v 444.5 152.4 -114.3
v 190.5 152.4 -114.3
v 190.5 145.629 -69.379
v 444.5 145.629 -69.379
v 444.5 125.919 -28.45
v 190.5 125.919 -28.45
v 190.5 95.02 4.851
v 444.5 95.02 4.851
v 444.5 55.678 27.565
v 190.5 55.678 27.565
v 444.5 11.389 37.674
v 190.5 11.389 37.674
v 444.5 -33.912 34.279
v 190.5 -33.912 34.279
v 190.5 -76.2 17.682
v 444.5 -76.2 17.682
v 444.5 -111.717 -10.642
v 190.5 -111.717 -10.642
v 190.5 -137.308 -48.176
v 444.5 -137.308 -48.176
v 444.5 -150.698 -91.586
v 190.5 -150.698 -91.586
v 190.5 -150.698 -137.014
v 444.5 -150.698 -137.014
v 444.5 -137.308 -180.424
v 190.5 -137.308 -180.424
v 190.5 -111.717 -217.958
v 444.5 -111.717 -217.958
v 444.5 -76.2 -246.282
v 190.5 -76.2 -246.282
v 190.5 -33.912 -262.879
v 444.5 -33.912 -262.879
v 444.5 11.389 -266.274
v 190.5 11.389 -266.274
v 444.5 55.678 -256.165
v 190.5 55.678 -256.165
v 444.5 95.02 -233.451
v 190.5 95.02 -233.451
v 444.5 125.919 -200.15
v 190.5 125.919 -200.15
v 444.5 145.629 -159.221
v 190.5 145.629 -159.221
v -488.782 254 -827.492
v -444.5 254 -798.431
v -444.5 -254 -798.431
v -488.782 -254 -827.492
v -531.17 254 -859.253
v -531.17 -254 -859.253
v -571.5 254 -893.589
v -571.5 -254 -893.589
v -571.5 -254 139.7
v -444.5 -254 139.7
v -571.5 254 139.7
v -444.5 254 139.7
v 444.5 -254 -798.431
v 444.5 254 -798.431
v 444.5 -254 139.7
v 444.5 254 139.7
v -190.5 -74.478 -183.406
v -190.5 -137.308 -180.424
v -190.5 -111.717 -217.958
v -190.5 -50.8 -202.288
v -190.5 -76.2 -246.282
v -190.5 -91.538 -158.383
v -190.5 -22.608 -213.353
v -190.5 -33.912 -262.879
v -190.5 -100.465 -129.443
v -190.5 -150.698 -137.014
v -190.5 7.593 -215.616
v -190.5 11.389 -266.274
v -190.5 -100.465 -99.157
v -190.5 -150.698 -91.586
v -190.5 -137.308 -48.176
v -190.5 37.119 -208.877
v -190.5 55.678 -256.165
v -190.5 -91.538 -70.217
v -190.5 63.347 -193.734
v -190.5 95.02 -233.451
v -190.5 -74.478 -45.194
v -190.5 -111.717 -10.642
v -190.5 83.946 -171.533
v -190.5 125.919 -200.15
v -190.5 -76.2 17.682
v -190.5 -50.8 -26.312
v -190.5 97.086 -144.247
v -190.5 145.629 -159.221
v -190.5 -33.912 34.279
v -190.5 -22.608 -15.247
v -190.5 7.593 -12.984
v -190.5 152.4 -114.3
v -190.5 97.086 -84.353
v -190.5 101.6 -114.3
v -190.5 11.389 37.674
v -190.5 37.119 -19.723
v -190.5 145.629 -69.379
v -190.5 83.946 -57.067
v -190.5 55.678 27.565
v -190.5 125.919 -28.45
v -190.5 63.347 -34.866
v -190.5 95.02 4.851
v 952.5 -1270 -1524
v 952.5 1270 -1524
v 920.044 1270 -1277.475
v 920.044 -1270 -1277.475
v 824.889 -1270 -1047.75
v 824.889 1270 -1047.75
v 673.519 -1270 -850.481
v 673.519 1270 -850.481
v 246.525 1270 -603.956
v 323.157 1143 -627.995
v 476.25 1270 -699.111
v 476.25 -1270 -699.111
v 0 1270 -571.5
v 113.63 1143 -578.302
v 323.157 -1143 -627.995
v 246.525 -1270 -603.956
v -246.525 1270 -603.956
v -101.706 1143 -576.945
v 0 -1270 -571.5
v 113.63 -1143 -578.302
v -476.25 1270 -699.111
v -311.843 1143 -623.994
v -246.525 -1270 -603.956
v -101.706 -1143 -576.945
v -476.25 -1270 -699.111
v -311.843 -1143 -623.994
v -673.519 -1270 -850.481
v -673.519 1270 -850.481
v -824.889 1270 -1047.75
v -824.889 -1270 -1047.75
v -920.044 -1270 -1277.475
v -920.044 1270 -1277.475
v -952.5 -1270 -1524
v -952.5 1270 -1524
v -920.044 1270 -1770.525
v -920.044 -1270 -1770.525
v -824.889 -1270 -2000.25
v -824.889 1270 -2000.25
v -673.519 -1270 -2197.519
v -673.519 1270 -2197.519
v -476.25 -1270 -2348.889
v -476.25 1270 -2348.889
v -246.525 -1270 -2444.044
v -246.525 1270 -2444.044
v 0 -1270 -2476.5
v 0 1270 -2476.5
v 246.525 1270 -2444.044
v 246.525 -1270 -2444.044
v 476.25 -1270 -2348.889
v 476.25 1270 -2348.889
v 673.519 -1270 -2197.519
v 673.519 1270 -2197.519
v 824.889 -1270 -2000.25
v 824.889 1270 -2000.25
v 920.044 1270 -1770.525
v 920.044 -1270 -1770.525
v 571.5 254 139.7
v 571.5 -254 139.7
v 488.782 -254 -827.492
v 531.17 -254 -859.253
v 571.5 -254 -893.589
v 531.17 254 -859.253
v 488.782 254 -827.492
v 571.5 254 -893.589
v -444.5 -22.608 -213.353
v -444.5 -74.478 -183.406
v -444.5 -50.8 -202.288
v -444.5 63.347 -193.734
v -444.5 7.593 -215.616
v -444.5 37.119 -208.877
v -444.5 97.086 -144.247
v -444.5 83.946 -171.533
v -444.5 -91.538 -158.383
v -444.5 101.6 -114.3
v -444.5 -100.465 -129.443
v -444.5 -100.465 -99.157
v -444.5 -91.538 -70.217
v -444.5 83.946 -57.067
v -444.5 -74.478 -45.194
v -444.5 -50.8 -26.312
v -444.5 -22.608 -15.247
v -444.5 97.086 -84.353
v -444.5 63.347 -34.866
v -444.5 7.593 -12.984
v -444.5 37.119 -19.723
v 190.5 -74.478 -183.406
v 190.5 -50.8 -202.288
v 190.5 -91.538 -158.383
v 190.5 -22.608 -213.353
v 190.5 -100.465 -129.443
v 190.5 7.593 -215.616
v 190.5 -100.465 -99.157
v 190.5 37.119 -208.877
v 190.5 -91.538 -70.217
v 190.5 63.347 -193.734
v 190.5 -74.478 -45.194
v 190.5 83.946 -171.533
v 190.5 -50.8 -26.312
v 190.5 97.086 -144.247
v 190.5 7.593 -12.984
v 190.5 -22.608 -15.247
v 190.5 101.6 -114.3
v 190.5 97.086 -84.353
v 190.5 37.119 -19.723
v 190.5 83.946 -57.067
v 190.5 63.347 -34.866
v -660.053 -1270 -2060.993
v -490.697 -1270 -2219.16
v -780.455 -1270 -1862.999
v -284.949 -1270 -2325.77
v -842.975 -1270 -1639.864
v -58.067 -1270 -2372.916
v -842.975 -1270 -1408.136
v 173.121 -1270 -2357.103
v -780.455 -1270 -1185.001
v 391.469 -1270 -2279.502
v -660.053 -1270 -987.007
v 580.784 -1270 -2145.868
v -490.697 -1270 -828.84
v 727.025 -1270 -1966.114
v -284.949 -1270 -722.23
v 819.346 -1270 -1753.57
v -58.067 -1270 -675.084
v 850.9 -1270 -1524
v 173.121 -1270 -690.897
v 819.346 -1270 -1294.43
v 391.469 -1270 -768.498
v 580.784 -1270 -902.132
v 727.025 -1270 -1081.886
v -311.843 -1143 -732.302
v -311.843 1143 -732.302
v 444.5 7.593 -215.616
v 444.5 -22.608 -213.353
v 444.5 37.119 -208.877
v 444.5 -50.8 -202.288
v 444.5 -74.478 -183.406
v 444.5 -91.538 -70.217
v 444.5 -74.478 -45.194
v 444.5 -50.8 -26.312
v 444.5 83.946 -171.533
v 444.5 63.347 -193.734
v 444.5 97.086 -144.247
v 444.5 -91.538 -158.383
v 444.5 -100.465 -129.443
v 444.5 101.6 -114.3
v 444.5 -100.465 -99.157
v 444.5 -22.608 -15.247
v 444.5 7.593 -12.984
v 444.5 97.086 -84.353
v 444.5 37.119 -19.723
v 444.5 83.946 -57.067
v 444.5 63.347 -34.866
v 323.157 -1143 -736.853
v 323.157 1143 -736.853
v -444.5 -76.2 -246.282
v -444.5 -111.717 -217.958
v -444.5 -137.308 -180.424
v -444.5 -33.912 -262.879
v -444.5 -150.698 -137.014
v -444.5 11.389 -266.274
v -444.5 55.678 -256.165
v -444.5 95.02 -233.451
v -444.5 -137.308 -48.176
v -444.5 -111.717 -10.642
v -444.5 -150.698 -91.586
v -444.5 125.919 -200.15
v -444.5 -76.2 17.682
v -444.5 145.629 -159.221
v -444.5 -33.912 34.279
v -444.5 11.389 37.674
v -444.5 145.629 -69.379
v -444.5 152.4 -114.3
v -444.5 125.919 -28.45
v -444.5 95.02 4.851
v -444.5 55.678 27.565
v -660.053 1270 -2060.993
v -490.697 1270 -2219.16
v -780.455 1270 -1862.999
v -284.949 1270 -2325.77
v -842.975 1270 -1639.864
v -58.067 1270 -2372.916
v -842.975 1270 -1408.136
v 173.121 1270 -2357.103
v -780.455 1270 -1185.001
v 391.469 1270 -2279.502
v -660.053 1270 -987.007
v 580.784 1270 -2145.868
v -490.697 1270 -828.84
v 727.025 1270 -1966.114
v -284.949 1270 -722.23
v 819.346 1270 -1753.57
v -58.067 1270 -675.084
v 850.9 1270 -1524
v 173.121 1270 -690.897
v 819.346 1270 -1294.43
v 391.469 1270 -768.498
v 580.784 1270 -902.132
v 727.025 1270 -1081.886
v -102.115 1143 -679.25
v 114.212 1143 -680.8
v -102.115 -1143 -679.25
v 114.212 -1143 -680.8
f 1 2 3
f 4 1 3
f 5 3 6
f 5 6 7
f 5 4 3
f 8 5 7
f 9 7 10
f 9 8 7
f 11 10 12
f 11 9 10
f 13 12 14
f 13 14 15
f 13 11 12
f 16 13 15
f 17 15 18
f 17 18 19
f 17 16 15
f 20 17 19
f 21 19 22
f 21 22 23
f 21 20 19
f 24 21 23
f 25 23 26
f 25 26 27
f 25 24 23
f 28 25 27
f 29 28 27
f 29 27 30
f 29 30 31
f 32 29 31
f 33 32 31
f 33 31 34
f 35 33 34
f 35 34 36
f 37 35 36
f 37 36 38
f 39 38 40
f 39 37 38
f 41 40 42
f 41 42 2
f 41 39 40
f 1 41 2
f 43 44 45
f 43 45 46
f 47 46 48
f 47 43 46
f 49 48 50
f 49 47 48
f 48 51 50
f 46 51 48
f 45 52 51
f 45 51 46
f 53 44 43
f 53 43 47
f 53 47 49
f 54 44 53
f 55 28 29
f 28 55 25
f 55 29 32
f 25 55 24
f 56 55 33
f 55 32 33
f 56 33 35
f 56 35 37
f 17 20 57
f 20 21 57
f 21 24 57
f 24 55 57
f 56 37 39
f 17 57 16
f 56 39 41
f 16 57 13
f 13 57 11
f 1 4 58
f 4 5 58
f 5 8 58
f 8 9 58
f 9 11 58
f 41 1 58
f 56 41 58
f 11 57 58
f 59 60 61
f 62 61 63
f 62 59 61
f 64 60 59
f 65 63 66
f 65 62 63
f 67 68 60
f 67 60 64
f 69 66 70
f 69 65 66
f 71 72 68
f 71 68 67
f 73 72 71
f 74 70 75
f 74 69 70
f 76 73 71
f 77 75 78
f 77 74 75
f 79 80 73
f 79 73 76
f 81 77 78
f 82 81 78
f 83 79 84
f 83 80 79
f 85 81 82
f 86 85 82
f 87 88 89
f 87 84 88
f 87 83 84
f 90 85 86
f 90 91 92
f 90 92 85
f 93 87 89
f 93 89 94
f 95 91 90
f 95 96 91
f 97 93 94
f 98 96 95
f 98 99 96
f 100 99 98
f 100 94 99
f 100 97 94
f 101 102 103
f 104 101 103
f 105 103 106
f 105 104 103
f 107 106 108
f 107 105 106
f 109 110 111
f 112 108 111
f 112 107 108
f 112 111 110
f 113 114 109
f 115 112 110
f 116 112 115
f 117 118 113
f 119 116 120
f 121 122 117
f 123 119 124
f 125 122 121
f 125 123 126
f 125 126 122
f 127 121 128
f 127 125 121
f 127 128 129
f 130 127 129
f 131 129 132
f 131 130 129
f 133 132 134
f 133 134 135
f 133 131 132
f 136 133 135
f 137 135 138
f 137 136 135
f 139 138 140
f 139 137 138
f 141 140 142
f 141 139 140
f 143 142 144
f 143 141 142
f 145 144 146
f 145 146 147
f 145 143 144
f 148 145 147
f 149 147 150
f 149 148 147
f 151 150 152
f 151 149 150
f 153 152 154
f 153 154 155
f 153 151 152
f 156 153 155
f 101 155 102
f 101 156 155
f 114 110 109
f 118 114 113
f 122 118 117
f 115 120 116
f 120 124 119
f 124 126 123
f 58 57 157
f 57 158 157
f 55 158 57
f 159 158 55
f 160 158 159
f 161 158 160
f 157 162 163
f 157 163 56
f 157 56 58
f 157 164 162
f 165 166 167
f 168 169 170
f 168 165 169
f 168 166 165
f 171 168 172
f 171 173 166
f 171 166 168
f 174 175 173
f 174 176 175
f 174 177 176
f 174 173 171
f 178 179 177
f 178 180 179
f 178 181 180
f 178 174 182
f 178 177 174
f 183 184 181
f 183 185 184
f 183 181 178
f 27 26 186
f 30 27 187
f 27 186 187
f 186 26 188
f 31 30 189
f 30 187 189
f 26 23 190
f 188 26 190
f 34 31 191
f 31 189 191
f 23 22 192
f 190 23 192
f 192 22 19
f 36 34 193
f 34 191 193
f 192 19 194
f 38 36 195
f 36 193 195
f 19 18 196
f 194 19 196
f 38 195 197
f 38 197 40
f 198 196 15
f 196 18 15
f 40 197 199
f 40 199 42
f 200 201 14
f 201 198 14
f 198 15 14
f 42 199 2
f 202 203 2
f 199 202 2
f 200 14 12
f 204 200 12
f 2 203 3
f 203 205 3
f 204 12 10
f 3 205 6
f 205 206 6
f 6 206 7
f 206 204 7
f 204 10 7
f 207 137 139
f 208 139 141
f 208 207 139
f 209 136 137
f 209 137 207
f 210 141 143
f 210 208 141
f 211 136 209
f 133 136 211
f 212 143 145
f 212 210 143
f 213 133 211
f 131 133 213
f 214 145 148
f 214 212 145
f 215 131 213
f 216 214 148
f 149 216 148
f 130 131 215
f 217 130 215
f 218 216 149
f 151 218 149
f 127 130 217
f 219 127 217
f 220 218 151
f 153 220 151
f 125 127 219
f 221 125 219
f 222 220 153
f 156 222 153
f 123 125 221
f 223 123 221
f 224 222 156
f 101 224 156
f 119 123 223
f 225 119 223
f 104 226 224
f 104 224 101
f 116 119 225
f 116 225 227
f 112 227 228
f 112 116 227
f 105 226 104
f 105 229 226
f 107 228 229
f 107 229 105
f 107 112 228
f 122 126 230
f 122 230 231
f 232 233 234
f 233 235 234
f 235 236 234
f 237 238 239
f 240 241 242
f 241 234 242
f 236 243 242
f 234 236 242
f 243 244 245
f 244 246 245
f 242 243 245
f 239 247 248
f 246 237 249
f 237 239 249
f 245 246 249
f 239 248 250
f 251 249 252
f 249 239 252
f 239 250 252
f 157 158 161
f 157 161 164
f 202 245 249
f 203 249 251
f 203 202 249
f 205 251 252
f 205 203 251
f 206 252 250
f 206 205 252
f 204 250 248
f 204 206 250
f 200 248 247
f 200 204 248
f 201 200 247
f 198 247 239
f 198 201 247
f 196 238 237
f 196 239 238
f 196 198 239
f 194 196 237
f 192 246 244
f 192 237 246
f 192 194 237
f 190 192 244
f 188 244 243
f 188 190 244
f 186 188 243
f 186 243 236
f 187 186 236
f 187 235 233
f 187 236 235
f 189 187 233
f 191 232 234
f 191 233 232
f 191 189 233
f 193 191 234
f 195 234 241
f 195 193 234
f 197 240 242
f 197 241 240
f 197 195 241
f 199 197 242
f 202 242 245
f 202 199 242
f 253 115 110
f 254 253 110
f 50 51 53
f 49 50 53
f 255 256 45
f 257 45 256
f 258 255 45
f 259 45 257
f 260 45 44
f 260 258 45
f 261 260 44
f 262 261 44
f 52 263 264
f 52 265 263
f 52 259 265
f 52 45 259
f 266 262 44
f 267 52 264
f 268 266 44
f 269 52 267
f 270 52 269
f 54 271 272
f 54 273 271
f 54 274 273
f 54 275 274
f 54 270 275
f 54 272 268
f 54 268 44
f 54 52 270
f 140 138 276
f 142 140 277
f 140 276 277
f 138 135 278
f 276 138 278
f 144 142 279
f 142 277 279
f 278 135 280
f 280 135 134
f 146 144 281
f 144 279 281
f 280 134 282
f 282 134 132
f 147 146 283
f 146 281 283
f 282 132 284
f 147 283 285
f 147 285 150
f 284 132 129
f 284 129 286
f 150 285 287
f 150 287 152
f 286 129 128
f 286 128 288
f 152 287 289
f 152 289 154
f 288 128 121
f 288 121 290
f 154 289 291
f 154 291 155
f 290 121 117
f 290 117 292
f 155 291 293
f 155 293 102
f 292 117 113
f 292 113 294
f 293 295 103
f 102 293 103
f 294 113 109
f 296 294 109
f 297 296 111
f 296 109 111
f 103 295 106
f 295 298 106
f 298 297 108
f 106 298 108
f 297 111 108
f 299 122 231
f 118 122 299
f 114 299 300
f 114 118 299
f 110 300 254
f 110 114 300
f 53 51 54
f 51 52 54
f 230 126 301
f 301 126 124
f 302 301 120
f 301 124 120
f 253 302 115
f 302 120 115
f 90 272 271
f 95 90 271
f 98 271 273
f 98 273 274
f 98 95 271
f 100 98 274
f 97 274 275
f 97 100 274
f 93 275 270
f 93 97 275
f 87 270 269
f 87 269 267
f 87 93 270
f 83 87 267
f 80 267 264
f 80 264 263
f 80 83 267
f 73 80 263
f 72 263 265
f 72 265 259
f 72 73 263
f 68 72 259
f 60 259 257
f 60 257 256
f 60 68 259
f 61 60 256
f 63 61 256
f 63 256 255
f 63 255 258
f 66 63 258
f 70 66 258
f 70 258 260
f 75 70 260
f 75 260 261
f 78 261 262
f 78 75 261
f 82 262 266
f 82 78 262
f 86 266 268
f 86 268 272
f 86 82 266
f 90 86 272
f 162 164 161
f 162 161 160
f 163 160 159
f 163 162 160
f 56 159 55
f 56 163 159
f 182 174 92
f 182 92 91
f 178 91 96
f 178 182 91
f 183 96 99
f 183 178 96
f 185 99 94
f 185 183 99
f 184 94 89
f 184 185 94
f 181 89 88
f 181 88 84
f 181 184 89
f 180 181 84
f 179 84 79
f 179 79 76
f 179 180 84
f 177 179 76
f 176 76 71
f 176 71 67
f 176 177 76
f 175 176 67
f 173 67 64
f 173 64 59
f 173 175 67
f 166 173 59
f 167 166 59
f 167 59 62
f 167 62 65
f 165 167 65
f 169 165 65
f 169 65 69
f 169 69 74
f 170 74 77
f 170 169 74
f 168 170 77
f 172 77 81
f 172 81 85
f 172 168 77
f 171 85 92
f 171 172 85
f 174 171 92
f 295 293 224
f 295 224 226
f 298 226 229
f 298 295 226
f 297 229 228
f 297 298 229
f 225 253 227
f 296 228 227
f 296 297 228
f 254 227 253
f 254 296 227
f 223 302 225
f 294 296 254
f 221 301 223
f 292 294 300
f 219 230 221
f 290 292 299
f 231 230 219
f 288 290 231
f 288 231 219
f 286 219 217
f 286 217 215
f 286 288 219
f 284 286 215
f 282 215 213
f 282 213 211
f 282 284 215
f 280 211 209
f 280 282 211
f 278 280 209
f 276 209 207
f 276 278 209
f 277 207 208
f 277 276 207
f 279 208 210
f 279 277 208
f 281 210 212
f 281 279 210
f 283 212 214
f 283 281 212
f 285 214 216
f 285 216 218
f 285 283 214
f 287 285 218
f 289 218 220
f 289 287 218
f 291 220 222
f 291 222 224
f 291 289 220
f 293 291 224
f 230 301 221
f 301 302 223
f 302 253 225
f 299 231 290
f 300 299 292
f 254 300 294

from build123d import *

# Parameters (mm, degrees)
F0_R      = 152.4
F0_R_2    = 101.6
F1_DEPTH  = 508
F2_DEPTH  = 190.5
F4_W      = 508
F4_H      = 635
F4_H_2    = 508
F6_DEPTH  = 63.5
F8_W      = 508
F8_H      = 863.6
F8_H_2    = 279.4
F9_DEPTH  = 63.5
F5_R      = 952.5
F5_R_2    = 850.9
F10_DEPTH = 1270
F11_DEPTH = 1270.001
F12_DEPTH = 1270.001
F14_W     = 635
F14_H     = 2286
F15_DEPTH = 508


with BuildPart() as f1:
    # F0 (on Right) → F1 (new body, symmetric)
    with BuildSketch(Plane.YZ):
        with Locations((0, -114.3)):
            Circle(F0_R)
        with Locations((0, -114.3)):
            Circle(F0_R_2, mode=Mode.SUBTRACT)
    extrude(amount=F1_DEPTH, both=True)

    # F0 (on Right) → F2 (cut, symmetric)
    with BuildSketch(Plane.YZ):
        with Locations((0, -114.3)):
            Circle(F0_R)
        with Locations((0, -114.3)):
            Circle(F0_R_2, mode=Mode.SUBTRACT)
    extrude(amount=F2_DEPTH, both=True, mode=Mode.SUBTRACT)

    # F4 (on offset) → F6 (join, symmetric)
    with BuildSketch(Plane.YZ.offset(508)):
        with Locations((0, -685.8)):
            Rectangle(F4_W, F4_H)
        with Locations((0, -114.3)):
            Rectangle(F4_W, F4_H_2)
    extrude(amount=F6_DEPTH, both=True)

    # F8 (on offset) → F9 (join, symmetric)
    with BuildSketch(Plane.YZ.offset(-508)):
        with Locations((0, -571.5)):
            Rectangle(F8_W, F8_H)
        Rectangle(F8_W, F8_H_2)
    extrude(amount=F9_DEPTH, both=True)

    # F5 (on Front) → F11 (cut, through all)
    with BuildSketch(Plane.XZ):
        with Locations((0, -1524)):
            Circle(F5_R_2)
    extrude(amount=-F11_DEPTH, mode=Mode.SUBTRACT)

    # F5 (on Front) → F12 (cut, through all)
    with BuildSketch(Plane.XZ):
        with Locations((0, -1524)):
            Circle(F5_R_2)
    extrude(amount=F12_DEPTH, mode=Mode.SUBTRACT)


with BuildPart() as f10:
    # F5 (on Front) → F10 (new body, symmetric)
    with BuildSketch(Plane.XZ):
        with Locations((0, -1524)):
            Circle(F5_R)
        with Locations((0, -1524)):
            Circle(F5_R_2, mode=Mode.SUBTRACT)
    extrude(amount=F10_DEPTH, both=True)

    # F14 (on offset) → F15 (cut)
    with BuildSketch(Plane.XY.offset(-381)):
        with Locations((5.657432, 0)):
            Rectangle(F14_W, F14_H)
    extrude(amount=-F15_DEPTH, mode=Mode.SUBTRACT)


solid = Compound([f1.part, f10.part])
